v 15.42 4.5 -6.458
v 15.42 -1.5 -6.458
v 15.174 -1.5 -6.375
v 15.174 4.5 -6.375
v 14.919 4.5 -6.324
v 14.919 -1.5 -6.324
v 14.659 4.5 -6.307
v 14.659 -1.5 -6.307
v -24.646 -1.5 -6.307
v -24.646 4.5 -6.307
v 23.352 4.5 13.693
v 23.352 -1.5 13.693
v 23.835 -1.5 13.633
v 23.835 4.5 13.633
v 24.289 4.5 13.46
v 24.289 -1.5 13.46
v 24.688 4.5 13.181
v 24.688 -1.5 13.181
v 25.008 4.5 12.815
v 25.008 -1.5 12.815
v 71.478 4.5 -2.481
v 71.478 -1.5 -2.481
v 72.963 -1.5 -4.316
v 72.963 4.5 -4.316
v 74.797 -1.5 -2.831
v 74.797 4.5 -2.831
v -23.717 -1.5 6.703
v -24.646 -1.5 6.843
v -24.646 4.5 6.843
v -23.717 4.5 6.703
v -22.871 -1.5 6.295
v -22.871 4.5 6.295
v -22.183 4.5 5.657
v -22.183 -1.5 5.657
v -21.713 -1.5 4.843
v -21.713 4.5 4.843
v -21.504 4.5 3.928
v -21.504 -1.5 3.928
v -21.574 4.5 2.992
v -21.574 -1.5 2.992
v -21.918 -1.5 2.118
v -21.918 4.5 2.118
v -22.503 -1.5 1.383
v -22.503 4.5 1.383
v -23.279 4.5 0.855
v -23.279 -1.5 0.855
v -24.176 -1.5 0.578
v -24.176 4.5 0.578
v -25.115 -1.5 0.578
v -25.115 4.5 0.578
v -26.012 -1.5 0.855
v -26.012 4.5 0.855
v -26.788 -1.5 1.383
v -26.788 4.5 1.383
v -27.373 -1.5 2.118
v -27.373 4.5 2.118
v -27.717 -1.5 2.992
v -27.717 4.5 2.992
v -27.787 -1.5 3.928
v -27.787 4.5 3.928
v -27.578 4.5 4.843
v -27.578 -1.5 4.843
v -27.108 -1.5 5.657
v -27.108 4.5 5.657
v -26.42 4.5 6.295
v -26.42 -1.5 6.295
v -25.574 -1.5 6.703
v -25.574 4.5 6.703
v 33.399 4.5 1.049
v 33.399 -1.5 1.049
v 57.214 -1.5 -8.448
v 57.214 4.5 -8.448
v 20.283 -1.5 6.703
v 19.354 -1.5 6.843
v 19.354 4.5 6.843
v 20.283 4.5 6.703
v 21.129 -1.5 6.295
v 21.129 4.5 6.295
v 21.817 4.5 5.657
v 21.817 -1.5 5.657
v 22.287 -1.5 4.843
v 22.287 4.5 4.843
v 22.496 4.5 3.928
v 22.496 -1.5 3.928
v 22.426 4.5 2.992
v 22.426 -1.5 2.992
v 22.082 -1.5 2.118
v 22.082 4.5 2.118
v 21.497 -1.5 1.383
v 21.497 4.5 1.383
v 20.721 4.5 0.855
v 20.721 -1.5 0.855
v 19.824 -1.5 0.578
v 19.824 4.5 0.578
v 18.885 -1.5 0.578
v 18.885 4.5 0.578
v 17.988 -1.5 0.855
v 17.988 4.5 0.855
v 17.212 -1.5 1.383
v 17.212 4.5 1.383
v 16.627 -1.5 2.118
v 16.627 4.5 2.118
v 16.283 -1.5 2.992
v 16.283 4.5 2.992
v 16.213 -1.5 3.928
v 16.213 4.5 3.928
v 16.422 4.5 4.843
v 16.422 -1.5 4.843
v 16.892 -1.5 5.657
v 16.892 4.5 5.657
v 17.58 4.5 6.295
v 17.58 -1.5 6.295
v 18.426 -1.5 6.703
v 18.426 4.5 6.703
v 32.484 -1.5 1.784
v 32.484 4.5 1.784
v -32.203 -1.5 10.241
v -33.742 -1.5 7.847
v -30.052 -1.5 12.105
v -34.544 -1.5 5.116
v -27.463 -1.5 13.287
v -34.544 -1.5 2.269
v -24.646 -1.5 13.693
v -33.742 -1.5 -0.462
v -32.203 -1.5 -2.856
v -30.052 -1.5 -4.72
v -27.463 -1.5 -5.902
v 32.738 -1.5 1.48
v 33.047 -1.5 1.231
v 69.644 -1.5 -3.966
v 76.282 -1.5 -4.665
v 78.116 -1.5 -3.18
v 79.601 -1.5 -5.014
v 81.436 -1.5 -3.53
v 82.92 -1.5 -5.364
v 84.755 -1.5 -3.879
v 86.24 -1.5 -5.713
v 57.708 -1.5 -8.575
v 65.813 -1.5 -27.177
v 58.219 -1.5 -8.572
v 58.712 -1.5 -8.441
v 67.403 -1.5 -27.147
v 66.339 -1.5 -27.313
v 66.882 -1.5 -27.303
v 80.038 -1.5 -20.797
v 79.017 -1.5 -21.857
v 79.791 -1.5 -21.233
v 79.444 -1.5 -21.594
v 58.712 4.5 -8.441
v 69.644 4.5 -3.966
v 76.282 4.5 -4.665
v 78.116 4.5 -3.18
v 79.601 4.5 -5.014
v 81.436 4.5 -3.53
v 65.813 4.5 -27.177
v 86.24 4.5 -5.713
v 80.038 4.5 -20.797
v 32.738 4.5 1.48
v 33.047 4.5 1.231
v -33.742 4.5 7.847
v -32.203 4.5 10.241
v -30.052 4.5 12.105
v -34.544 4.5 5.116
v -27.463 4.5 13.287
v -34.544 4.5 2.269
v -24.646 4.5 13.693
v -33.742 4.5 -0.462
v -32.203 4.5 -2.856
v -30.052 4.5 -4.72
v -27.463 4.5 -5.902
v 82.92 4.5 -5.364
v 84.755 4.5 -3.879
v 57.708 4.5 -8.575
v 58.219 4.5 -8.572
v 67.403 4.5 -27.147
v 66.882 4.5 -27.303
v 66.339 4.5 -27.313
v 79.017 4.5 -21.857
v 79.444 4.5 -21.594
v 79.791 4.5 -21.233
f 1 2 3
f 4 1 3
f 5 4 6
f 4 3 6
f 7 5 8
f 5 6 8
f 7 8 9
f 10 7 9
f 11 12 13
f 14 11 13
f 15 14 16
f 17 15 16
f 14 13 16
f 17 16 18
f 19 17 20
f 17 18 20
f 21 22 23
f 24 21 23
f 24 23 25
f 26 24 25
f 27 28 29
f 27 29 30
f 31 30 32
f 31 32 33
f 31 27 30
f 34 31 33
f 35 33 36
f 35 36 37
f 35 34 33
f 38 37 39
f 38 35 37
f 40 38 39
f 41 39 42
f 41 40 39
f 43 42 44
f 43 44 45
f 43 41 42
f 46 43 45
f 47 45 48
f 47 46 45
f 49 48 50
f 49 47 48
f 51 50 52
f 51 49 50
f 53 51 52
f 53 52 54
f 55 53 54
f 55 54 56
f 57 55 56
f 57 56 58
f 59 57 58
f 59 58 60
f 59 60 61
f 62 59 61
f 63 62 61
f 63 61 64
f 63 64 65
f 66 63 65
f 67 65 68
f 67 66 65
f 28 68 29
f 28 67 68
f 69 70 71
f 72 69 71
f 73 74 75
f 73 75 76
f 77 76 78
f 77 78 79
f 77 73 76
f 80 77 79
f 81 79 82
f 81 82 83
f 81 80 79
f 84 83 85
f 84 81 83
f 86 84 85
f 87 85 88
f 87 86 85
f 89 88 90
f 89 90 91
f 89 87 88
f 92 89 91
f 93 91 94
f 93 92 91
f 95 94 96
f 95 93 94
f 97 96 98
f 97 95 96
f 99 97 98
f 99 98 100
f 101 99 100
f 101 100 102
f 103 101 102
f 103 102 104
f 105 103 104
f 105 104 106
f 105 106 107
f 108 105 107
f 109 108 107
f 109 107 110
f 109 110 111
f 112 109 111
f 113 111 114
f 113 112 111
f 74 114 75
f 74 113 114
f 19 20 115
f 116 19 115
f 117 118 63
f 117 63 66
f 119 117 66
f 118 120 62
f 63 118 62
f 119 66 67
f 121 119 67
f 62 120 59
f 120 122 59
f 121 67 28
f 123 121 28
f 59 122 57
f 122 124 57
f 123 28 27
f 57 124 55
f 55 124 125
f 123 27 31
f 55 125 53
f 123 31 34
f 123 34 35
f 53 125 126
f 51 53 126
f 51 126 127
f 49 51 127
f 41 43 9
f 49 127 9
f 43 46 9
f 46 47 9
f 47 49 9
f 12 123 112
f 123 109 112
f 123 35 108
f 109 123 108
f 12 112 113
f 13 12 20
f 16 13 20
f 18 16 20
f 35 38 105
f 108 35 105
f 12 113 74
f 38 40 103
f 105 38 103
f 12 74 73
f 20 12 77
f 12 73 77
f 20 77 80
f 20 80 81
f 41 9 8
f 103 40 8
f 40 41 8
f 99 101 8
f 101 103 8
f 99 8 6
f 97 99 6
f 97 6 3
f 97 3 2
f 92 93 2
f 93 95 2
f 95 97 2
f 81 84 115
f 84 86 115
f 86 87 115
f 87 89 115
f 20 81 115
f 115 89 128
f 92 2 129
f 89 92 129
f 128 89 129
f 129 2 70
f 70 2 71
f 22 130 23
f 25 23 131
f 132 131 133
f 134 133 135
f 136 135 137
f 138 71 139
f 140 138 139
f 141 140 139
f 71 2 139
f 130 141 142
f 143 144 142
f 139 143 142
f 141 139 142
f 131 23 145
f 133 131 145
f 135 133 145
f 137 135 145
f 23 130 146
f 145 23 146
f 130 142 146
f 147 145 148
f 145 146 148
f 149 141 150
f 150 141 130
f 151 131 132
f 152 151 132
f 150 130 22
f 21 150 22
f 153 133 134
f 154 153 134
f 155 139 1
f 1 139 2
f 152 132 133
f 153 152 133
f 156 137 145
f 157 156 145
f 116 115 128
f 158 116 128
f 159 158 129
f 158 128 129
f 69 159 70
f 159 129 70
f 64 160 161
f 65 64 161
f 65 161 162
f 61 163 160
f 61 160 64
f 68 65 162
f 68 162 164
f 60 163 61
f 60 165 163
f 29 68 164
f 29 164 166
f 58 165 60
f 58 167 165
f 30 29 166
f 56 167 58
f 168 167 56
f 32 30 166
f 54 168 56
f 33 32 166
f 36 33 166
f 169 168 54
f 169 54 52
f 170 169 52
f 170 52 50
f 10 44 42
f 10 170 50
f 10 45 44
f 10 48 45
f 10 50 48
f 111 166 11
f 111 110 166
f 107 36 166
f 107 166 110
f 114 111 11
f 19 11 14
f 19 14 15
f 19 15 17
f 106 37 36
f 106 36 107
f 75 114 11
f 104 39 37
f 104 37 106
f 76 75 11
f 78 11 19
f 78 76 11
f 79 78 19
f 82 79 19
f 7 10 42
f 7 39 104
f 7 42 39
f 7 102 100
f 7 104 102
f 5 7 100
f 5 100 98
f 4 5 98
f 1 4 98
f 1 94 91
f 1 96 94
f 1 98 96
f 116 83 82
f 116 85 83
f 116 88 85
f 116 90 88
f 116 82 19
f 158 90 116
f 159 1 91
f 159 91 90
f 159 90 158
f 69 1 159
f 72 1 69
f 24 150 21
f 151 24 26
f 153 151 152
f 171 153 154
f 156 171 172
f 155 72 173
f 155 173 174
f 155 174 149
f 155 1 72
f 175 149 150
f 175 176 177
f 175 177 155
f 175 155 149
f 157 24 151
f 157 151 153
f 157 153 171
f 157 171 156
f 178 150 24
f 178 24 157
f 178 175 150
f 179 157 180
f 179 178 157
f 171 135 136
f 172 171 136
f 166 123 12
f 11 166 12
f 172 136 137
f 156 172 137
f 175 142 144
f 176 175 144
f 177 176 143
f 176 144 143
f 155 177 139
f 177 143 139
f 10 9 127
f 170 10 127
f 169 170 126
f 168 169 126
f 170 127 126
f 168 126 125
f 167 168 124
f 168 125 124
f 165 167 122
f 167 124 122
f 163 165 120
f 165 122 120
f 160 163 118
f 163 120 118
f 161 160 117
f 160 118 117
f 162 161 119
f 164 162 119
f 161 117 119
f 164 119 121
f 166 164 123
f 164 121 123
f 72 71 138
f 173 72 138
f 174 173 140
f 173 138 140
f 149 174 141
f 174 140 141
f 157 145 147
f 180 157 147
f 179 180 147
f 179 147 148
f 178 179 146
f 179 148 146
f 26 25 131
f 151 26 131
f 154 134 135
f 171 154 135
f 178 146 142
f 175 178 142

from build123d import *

# Parameters (mm, degrees)
SKETCH1_R           = 1.575
BOSS_EXTRUDE1_DEPTH = 3
L_EK1_SCALE         = 2


with BuildPart() as part:
    # Sketch1 → Boss-Extrude1 (new body)
    with BuildSketch(Plane(origin=(0, 0, 0), x_dir=(1, 0, 0), z_dir=(0, 1, 0))):
        with BuildLine():
            Line((0, -5), (23.998875872, -5))
            ThreePointArc((23.998875872, -5), (24.467345461, -4.883479623), (24.826642543, -4.561072489))
            Line((24.826642543, -4.561072489), (28.564941326, 0.954149161))
            ThreePointArc((28.564941326, 0.954149161), (28.766036178, 1.172359953), (29.022312673, 1.321950886))
            Line((29.022312673, 1.321950886), (40.929553216, 6.070049343))
            ThreePointArc((40.929553216, 6.070049343), (41.304486381, 6.141164834), (41.678758689, 6.066649533))
            Line((41.678758689, 6.066649533), (47.144586244, 3.829406729))
            Line((47.144586244, 3.829406729), (48.06174016, 3.086958957))
            Line((48.06174016, 3.086958957), (48.804187932, 4.004112872))
            Line((48.804187932, 4.004112872), (49.721341848, 3.2616651))
            Line((49.721341848, 3.2616651), (50.46378962, 4.178819016))
            Line((50.46378962, 4.178819016), (51.380943536, 3.436371244))
            Line((51.380943536, 3.436371244), (52.123391308, 4.35352516))
            Line((52.123391308, 4.35352516), (53.040545224, 3.611077387))
            Line((53.040545224, 3.611077387), (53.782992996, 4.528231303))
            Line((53.782992996, 4.528231303), (54.700146912, 3.785783531))
            Line((54.700146912, 3.785783531), (55.442594685, 4.702937447))
            Line((55.442594685, 4.702937447), (52.341745918, 12.244834503))
            ThreePointArc((52.341745918, 12.244834503), (52.137055639, 12.558350103), (51.831402108, 12.774604725))
            Line((51.831402108, 12.774604725), (46.024183924, 15.419882568))
            ThreePointArc((46.024183924, 15.419882568), (45.628323444, 15.509674561), (45.229386093, 15.434727162))
            Line((45.229386093, 15.434727162), (20.032711481, 5.075121772))
            ThreePointArc((20.032711481, 5.075121772), (19.846254378, 5.018960187), (19.652448068, 5))
            Line((19.652448068, 5), (0, 5))
            ThreePointArc((0, 5), (-5, 0), (0, -5))
        make_face()
        with Locations(Location((0, 0, 0), (0, 0, 270))):
            Circle(SKETCH1_R, mode=Mode.SUBTRACT)
        with Locations(Location((22, 0, 0), (0, 0, 270))):
            Circle(SKETCH1_R, mode=Mode.SUBTRACT)
    extrude(amount=BOSS_EXTRUDE1_DEPTH)


with BuildPart() as part_1:
    # Ölçek1: scaled about (24.645515764, 1.5, -3.692559234)
    add(part.part.scale(L_EK1_SCALE).moved(Location((-24.645515764, -1.5, 3.692559234))))


solid = part_1.part
